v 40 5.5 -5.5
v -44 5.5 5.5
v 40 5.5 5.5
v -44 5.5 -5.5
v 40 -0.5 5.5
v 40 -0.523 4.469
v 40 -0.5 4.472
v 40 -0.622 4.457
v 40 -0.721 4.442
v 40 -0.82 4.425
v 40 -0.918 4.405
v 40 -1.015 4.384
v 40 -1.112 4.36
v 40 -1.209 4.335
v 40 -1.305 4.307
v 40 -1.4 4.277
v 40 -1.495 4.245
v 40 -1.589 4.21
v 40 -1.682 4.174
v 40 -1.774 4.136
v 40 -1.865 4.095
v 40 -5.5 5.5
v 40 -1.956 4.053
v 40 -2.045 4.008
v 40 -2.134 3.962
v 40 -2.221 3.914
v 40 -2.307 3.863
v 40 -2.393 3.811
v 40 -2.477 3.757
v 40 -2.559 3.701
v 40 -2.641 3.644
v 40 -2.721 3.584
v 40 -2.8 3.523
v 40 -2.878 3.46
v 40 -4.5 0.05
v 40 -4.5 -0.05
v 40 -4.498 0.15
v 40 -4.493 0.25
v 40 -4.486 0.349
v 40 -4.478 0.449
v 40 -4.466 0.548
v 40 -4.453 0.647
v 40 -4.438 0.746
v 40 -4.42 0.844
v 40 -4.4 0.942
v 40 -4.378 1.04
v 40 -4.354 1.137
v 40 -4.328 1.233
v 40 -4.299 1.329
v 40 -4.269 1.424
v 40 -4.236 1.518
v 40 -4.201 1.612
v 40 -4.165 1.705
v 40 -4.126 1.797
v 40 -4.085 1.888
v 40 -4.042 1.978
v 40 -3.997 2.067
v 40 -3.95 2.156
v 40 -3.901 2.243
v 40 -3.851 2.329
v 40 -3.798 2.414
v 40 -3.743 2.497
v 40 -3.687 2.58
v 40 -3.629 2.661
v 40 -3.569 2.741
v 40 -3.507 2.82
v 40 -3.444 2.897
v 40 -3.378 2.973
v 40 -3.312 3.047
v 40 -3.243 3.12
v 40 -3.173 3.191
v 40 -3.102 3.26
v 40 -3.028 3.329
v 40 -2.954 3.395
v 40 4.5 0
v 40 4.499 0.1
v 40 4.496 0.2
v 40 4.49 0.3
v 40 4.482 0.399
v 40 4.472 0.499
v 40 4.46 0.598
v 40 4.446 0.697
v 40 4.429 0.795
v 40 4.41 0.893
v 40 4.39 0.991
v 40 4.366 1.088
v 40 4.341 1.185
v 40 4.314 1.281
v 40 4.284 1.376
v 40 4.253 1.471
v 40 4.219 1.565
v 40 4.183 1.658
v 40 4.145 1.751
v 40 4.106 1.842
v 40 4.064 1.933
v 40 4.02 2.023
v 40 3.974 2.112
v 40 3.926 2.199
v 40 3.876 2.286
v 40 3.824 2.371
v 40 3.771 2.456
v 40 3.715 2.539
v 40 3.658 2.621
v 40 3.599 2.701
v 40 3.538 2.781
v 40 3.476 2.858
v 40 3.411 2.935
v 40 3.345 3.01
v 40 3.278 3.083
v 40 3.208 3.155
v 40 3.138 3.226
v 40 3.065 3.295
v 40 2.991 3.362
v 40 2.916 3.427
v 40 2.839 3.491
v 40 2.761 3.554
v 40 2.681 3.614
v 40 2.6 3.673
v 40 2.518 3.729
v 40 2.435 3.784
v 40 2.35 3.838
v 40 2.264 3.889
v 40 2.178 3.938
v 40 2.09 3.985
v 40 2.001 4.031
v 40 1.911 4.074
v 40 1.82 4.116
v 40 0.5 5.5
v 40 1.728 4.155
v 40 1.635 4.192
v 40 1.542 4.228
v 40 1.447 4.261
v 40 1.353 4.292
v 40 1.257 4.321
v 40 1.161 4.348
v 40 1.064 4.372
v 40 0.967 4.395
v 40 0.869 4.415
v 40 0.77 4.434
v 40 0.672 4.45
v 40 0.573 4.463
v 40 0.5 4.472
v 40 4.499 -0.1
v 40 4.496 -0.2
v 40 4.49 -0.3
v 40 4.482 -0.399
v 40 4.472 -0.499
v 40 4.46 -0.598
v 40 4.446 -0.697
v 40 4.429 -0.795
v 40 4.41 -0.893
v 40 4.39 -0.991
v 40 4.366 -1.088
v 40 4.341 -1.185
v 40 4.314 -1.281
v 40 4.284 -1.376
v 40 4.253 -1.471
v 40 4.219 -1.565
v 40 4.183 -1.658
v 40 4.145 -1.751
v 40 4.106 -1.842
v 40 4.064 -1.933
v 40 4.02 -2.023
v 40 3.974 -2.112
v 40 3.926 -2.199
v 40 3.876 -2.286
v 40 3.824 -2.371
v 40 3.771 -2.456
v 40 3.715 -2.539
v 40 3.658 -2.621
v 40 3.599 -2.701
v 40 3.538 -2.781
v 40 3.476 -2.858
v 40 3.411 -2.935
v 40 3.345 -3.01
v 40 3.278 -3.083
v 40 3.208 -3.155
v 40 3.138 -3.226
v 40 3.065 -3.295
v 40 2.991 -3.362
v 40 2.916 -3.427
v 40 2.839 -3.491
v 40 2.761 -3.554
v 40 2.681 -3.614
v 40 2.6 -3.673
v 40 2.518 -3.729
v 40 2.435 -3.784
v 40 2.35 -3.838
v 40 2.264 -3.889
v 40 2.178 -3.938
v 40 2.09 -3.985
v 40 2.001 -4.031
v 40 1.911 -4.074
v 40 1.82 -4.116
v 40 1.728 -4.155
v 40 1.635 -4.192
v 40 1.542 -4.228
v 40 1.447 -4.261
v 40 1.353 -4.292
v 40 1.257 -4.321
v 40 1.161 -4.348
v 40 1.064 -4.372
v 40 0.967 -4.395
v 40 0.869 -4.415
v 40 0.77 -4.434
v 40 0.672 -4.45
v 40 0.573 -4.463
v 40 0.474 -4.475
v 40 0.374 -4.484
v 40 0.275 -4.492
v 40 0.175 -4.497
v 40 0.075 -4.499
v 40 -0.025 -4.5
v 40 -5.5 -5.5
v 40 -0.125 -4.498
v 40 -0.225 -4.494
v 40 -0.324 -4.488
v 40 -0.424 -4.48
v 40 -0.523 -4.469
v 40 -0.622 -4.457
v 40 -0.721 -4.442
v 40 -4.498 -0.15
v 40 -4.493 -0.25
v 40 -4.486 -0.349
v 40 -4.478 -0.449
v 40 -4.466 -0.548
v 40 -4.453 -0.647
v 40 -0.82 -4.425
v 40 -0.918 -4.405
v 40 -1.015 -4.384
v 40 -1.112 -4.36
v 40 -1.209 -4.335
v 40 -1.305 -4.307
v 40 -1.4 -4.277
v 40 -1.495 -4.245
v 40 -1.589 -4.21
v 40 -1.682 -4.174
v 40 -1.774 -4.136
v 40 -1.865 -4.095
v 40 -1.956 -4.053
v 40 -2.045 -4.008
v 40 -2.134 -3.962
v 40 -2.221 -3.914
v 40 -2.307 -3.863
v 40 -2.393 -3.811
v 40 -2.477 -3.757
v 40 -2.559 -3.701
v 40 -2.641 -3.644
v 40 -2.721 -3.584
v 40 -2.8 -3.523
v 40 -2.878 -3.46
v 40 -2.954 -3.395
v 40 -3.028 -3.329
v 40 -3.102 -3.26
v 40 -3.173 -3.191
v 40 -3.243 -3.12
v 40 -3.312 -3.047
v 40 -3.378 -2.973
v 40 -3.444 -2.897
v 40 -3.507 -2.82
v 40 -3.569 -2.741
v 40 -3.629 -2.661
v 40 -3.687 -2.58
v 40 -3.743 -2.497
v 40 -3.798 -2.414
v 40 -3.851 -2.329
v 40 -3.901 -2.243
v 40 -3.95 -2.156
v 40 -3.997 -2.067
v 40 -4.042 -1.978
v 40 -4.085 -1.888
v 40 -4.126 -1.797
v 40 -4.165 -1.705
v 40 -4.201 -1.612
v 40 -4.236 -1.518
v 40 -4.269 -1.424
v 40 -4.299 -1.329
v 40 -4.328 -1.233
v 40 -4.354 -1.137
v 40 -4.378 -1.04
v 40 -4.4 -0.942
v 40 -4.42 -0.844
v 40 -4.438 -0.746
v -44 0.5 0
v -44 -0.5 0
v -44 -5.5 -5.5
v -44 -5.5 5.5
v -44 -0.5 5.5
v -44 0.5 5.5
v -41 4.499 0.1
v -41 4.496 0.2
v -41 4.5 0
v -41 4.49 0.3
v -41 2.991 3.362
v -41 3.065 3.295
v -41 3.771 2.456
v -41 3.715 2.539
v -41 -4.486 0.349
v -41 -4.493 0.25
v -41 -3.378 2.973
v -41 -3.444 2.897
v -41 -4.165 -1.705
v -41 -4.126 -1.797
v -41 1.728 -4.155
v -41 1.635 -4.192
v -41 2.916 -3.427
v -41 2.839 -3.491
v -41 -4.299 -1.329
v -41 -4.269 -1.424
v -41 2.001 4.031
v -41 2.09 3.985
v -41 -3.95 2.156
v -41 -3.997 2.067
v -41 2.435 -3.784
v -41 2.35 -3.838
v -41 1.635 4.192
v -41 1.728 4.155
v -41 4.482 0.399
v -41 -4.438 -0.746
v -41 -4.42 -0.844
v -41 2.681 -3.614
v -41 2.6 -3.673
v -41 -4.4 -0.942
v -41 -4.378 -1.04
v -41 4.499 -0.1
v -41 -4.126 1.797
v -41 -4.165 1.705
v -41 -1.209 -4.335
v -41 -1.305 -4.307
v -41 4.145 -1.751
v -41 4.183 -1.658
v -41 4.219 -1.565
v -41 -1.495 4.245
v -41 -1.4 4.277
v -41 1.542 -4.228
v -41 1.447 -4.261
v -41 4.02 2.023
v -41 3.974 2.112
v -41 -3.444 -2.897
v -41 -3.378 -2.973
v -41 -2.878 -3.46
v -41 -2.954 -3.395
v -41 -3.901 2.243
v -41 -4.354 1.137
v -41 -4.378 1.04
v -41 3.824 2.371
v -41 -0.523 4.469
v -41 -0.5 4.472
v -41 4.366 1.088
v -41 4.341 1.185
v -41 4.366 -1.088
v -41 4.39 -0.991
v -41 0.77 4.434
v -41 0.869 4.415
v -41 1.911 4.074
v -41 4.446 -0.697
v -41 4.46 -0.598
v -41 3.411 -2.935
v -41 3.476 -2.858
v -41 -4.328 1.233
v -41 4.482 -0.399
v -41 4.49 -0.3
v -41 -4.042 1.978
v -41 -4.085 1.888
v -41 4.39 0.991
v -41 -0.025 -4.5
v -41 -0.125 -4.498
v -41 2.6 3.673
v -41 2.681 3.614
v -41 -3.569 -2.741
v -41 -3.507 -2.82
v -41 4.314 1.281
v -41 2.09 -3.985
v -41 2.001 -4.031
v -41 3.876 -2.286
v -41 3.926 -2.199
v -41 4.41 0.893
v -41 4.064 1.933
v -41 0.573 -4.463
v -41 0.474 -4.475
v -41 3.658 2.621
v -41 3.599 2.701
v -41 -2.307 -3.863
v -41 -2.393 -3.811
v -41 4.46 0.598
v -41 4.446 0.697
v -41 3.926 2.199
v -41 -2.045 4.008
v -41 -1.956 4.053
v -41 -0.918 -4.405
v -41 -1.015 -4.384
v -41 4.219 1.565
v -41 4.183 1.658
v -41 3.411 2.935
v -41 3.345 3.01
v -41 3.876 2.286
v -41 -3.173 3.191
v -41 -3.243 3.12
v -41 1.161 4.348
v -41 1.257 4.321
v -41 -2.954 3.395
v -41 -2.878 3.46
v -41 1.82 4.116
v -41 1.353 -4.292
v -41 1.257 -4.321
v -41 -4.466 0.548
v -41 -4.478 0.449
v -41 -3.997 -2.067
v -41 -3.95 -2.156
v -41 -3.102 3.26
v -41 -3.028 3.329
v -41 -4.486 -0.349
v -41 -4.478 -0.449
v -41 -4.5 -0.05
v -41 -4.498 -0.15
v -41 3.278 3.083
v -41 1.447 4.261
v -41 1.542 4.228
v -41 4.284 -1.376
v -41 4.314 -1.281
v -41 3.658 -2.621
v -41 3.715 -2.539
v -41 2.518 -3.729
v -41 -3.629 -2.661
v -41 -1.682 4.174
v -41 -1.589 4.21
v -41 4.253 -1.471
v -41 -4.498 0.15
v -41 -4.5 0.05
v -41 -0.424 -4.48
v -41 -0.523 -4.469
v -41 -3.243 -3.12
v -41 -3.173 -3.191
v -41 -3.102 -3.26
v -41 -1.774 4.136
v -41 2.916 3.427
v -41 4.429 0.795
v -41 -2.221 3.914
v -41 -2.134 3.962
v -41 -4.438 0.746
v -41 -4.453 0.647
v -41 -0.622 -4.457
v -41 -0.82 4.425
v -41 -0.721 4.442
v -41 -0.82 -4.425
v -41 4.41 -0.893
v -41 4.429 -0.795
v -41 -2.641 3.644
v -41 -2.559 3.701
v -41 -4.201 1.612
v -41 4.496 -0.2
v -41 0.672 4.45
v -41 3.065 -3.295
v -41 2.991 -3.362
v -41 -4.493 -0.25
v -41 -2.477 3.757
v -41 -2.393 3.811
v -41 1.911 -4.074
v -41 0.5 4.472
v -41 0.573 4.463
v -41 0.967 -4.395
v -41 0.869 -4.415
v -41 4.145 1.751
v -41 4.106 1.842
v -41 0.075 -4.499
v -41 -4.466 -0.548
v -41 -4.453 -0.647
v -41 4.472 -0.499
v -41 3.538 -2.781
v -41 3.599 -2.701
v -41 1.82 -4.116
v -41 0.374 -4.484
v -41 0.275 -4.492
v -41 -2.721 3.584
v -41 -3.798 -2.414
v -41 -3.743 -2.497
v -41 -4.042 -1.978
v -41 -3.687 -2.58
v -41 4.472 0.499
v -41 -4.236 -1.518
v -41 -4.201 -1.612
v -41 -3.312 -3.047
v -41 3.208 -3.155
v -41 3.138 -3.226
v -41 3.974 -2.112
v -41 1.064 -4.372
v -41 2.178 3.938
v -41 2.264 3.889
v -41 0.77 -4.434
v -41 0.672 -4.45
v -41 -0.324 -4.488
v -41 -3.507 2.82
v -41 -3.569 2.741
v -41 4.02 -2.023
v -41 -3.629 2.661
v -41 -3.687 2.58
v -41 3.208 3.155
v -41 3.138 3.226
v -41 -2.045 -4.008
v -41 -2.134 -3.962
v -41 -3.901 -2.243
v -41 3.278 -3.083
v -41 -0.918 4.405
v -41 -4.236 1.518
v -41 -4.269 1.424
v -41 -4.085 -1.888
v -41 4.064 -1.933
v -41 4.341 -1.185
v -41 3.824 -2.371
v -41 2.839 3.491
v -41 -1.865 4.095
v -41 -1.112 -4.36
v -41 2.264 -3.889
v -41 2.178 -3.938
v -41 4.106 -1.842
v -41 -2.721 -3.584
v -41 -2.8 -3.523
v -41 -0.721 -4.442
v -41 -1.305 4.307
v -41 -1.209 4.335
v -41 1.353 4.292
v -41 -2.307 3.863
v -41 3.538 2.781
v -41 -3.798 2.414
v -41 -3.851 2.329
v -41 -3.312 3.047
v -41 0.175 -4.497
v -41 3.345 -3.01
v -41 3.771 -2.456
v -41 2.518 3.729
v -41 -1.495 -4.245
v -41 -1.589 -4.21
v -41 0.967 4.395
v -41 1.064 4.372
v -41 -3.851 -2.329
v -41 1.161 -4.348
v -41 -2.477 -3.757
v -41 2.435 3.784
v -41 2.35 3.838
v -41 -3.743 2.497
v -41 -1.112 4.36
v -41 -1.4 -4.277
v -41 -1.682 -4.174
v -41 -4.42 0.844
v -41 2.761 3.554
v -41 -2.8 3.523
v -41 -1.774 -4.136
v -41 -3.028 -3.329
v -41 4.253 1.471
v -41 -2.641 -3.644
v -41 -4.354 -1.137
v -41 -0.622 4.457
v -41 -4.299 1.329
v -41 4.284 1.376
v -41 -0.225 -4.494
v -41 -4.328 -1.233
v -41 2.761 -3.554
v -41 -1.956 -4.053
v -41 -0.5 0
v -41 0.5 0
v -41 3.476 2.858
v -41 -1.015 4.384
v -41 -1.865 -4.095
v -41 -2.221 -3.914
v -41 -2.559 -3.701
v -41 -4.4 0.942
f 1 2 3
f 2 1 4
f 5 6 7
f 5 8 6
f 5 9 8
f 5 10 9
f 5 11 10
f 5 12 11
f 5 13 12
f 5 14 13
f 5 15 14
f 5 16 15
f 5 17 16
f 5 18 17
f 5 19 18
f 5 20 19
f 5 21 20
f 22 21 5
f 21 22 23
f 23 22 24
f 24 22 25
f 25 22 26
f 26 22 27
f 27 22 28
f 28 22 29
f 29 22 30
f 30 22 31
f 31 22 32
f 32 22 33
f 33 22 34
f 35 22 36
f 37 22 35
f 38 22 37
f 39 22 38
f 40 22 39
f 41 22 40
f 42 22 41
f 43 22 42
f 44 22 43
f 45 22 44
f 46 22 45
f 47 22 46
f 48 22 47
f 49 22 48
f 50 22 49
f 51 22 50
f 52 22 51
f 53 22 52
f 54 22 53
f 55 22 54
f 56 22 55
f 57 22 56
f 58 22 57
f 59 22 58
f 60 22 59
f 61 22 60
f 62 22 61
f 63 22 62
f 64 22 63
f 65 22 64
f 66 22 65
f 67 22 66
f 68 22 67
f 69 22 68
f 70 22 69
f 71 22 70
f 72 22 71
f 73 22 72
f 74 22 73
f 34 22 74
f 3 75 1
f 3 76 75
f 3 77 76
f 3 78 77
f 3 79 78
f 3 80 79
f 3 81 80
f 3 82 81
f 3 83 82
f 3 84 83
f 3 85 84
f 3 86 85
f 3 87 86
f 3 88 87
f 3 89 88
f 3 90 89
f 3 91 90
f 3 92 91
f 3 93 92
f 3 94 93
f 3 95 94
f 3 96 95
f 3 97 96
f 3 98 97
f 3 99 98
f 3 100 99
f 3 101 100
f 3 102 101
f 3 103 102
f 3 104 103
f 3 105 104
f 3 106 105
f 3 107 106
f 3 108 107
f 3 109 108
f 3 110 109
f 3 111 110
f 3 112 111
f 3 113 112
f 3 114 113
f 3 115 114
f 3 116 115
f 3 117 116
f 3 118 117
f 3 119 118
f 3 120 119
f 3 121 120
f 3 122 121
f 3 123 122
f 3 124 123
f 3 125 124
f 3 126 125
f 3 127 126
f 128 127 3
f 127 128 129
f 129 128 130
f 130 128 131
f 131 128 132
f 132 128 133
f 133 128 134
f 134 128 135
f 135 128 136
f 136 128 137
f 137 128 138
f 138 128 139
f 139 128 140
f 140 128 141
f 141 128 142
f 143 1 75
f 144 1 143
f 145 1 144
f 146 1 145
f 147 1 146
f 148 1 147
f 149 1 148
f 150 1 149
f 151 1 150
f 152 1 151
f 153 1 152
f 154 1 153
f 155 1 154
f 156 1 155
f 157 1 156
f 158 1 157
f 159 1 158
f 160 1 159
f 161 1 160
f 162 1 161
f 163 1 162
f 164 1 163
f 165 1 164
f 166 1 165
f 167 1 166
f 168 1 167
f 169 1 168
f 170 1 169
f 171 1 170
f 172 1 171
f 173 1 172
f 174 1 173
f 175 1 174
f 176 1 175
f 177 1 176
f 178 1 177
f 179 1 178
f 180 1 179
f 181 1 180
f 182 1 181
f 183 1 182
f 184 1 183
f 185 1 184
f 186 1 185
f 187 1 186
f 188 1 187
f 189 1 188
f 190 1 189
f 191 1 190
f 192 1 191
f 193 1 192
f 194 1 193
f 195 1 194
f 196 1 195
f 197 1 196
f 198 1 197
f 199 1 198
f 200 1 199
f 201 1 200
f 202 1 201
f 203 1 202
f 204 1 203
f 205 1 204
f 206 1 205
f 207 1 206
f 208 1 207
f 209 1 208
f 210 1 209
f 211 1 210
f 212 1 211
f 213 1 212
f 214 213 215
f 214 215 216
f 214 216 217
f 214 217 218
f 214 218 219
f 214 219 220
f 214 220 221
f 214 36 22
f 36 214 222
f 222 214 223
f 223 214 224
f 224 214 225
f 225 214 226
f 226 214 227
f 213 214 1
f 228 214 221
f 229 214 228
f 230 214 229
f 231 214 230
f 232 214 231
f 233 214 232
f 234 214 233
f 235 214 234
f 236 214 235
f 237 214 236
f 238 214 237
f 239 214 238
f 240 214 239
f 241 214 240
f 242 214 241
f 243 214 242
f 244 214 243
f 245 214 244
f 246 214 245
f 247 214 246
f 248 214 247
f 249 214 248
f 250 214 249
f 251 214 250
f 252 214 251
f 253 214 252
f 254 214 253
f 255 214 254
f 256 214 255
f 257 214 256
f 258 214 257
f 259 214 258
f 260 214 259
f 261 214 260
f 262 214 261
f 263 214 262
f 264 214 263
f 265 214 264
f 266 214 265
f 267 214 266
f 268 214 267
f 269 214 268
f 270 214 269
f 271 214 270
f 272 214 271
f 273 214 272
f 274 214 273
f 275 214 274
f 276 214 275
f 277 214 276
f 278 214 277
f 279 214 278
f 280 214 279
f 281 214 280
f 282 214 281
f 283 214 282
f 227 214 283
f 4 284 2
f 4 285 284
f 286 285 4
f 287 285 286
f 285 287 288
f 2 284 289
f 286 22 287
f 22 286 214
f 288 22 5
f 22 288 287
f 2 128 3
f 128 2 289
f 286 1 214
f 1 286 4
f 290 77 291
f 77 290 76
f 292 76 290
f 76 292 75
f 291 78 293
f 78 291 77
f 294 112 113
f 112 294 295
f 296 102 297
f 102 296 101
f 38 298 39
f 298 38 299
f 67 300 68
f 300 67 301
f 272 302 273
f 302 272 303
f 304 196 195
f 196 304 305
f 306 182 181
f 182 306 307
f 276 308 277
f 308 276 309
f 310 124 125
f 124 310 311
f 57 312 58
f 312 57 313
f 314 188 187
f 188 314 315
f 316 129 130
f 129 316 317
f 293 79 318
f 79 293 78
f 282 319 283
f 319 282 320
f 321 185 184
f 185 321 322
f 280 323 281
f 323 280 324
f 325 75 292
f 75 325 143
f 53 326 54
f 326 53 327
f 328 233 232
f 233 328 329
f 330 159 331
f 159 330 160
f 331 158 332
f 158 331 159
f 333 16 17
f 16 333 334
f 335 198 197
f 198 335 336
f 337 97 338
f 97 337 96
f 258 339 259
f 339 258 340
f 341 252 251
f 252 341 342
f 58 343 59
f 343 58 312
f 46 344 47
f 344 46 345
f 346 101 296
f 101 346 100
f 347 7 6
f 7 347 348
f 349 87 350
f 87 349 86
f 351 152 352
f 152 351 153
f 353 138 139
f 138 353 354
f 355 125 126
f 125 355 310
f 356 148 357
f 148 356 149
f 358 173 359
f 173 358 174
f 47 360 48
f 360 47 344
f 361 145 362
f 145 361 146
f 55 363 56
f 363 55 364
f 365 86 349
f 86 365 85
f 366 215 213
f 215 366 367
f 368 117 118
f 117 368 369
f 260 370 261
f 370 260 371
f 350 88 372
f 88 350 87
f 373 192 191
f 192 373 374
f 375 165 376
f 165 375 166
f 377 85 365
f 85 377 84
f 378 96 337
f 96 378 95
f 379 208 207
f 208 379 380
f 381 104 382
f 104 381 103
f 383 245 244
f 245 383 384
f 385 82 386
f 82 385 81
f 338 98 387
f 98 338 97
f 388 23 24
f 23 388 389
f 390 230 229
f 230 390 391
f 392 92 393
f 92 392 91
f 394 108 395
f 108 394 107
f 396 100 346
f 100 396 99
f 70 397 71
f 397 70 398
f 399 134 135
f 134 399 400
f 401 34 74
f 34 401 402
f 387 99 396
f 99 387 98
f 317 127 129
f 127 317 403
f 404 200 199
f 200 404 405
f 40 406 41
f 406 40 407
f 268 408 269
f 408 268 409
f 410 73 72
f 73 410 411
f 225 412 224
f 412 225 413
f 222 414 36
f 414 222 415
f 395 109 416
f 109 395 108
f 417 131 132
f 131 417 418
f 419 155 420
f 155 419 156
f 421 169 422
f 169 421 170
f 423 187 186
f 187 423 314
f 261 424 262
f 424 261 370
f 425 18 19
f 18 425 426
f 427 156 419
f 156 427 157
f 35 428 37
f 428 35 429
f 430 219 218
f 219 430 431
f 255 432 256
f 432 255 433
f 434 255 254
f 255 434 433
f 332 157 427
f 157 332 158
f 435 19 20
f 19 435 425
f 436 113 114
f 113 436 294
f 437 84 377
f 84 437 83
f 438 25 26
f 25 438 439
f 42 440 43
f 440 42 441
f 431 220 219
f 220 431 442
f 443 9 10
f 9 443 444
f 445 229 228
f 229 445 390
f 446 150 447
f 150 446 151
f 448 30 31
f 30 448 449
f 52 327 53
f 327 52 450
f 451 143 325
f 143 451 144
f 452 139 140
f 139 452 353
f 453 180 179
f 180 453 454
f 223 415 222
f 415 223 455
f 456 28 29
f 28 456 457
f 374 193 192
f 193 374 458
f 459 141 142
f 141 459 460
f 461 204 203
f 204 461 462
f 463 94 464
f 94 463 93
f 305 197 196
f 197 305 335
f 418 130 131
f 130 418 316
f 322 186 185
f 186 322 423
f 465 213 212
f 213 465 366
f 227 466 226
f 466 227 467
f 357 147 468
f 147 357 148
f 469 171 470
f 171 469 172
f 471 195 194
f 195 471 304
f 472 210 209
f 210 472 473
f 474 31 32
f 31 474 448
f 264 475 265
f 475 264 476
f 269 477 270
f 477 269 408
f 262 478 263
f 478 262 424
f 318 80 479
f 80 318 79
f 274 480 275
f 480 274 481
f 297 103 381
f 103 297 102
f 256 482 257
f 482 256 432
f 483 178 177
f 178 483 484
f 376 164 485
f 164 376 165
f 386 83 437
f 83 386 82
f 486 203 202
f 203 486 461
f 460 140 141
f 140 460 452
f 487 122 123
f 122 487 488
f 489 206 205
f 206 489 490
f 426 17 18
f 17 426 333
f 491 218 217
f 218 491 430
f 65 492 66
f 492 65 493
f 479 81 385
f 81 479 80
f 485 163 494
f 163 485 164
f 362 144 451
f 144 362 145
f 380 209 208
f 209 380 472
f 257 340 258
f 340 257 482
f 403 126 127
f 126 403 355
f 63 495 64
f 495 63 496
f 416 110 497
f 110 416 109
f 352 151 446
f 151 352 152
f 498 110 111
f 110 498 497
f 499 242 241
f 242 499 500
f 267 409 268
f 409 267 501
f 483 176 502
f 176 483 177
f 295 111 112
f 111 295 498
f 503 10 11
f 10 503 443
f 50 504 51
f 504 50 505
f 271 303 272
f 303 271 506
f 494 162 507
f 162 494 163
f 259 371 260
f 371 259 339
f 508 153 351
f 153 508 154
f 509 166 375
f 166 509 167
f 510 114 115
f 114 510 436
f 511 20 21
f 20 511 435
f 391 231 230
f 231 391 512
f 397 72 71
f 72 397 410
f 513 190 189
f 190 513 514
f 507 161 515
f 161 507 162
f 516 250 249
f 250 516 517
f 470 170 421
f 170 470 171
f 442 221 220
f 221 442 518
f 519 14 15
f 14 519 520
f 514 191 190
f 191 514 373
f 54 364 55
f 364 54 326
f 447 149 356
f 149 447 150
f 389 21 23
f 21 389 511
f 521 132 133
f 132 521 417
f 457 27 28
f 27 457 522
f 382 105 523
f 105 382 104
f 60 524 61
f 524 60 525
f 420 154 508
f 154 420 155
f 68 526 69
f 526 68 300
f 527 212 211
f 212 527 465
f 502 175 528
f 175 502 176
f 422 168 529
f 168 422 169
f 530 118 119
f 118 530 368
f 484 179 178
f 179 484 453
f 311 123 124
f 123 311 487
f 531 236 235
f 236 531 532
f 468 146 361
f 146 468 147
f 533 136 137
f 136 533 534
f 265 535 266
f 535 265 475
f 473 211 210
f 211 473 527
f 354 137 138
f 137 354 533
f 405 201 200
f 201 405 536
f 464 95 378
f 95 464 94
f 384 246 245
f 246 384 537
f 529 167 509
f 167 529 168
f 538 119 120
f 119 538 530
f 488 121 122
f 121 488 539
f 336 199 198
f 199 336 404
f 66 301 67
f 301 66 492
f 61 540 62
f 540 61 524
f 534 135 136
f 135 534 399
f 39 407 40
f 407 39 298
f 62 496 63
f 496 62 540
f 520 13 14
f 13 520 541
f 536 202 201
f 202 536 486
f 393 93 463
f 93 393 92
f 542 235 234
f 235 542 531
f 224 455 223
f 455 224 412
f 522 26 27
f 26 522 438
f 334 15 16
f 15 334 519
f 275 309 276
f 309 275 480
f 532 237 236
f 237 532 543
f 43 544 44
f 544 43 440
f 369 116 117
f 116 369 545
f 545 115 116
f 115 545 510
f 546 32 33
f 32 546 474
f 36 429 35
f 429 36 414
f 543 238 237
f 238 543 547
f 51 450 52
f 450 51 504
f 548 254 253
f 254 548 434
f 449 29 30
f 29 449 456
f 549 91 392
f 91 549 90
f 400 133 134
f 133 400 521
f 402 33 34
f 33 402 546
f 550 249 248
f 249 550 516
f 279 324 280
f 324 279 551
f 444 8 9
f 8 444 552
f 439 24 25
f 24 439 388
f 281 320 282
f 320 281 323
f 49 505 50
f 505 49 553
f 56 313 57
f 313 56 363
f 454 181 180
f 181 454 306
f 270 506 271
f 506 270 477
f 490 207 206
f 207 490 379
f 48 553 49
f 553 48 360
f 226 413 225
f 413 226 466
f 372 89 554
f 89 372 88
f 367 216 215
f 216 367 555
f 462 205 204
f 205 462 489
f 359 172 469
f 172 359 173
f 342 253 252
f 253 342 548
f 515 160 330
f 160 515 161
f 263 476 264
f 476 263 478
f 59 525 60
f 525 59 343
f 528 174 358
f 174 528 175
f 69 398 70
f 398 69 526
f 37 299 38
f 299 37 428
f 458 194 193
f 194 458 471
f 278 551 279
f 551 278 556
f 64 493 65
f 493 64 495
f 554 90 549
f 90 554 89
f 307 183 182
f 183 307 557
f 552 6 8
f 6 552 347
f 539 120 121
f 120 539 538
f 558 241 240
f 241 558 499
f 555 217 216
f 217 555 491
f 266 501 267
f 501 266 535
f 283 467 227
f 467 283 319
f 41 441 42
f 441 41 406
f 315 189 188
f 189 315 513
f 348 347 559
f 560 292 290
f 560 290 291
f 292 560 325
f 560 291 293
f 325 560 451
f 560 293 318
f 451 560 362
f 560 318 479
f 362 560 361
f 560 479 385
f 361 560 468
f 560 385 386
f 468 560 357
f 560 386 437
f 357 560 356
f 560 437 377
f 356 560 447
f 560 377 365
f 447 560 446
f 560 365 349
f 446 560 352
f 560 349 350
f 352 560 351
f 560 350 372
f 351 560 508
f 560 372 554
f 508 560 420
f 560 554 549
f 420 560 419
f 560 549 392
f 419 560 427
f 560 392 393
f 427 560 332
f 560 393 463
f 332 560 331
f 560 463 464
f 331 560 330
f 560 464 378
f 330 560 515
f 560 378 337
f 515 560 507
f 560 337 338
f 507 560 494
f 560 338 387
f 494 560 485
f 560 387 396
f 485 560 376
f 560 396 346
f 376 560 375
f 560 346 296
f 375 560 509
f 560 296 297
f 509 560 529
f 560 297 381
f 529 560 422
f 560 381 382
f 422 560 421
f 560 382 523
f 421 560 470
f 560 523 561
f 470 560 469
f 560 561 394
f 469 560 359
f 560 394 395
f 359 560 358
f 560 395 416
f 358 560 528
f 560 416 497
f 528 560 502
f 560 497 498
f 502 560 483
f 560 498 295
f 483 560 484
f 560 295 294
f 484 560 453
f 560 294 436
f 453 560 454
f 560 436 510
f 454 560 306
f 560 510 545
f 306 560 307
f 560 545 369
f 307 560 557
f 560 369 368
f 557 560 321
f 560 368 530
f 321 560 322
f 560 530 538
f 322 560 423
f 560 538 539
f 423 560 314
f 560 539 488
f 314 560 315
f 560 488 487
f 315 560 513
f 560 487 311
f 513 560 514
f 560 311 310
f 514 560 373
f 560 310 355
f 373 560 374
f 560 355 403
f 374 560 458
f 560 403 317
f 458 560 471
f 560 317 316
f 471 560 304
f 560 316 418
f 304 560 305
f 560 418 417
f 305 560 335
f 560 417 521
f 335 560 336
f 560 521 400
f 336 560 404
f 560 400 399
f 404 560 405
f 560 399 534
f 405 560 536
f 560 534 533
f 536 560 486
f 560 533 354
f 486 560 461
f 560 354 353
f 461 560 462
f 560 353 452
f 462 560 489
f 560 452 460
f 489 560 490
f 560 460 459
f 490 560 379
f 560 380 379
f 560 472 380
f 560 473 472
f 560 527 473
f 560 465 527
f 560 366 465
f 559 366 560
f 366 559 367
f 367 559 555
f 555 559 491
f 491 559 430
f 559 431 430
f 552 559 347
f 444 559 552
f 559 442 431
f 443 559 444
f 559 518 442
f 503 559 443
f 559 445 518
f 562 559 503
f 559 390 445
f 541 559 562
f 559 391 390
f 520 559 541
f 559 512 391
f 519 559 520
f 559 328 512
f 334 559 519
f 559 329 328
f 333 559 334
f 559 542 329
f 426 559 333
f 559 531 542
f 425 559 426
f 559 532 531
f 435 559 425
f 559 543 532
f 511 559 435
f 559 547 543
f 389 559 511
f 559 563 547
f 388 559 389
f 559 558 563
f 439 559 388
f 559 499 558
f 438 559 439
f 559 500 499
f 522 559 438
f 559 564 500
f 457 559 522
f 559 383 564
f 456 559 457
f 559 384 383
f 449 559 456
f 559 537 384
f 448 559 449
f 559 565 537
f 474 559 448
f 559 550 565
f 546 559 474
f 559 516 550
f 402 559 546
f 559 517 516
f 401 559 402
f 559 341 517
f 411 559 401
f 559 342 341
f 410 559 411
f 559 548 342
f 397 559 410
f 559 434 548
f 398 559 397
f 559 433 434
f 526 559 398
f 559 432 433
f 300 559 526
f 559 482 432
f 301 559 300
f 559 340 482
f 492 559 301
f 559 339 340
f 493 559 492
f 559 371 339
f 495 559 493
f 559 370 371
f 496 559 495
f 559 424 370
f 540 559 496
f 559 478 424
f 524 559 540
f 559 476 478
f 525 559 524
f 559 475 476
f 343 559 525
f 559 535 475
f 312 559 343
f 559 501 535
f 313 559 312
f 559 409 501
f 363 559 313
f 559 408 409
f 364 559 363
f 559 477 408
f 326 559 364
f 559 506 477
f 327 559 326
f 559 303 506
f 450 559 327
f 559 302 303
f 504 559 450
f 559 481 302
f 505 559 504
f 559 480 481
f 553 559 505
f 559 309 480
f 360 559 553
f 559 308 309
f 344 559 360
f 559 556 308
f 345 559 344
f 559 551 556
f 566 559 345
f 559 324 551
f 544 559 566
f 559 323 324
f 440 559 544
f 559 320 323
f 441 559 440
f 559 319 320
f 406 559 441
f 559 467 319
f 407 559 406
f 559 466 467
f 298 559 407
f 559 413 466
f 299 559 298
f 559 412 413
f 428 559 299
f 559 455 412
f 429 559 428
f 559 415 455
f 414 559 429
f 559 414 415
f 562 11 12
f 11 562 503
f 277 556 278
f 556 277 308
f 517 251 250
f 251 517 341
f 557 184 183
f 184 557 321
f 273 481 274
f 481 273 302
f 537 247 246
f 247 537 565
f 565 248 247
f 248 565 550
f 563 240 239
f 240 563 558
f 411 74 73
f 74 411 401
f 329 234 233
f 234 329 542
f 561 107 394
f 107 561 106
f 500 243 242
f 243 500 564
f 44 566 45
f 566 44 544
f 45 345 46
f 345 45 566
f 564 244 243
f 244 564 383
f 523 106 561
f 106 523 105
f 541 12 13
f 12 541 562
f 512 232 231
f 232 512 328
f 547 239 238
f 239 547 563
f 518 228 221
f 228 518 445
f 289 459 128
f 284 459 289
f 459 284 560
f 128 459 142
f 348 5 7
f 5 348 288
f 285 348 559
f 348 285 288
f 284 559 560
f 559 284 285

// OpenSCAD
//makes nicer circles:
$fa = 1;
$fs = 0.1;

cd = 9;
cl = 82;

rotate([90,0,90])
difference()
{
	translate([0,0,-2])
	cube([cd+2,cd+2,cl+2], true);

	translate([0,0,-cl/2])
	cylinder(cl, d = cd, true);
	
	translate([0,(cd+2)/2,-2])
	cube([1,cd+2,cl+2], true);
}
